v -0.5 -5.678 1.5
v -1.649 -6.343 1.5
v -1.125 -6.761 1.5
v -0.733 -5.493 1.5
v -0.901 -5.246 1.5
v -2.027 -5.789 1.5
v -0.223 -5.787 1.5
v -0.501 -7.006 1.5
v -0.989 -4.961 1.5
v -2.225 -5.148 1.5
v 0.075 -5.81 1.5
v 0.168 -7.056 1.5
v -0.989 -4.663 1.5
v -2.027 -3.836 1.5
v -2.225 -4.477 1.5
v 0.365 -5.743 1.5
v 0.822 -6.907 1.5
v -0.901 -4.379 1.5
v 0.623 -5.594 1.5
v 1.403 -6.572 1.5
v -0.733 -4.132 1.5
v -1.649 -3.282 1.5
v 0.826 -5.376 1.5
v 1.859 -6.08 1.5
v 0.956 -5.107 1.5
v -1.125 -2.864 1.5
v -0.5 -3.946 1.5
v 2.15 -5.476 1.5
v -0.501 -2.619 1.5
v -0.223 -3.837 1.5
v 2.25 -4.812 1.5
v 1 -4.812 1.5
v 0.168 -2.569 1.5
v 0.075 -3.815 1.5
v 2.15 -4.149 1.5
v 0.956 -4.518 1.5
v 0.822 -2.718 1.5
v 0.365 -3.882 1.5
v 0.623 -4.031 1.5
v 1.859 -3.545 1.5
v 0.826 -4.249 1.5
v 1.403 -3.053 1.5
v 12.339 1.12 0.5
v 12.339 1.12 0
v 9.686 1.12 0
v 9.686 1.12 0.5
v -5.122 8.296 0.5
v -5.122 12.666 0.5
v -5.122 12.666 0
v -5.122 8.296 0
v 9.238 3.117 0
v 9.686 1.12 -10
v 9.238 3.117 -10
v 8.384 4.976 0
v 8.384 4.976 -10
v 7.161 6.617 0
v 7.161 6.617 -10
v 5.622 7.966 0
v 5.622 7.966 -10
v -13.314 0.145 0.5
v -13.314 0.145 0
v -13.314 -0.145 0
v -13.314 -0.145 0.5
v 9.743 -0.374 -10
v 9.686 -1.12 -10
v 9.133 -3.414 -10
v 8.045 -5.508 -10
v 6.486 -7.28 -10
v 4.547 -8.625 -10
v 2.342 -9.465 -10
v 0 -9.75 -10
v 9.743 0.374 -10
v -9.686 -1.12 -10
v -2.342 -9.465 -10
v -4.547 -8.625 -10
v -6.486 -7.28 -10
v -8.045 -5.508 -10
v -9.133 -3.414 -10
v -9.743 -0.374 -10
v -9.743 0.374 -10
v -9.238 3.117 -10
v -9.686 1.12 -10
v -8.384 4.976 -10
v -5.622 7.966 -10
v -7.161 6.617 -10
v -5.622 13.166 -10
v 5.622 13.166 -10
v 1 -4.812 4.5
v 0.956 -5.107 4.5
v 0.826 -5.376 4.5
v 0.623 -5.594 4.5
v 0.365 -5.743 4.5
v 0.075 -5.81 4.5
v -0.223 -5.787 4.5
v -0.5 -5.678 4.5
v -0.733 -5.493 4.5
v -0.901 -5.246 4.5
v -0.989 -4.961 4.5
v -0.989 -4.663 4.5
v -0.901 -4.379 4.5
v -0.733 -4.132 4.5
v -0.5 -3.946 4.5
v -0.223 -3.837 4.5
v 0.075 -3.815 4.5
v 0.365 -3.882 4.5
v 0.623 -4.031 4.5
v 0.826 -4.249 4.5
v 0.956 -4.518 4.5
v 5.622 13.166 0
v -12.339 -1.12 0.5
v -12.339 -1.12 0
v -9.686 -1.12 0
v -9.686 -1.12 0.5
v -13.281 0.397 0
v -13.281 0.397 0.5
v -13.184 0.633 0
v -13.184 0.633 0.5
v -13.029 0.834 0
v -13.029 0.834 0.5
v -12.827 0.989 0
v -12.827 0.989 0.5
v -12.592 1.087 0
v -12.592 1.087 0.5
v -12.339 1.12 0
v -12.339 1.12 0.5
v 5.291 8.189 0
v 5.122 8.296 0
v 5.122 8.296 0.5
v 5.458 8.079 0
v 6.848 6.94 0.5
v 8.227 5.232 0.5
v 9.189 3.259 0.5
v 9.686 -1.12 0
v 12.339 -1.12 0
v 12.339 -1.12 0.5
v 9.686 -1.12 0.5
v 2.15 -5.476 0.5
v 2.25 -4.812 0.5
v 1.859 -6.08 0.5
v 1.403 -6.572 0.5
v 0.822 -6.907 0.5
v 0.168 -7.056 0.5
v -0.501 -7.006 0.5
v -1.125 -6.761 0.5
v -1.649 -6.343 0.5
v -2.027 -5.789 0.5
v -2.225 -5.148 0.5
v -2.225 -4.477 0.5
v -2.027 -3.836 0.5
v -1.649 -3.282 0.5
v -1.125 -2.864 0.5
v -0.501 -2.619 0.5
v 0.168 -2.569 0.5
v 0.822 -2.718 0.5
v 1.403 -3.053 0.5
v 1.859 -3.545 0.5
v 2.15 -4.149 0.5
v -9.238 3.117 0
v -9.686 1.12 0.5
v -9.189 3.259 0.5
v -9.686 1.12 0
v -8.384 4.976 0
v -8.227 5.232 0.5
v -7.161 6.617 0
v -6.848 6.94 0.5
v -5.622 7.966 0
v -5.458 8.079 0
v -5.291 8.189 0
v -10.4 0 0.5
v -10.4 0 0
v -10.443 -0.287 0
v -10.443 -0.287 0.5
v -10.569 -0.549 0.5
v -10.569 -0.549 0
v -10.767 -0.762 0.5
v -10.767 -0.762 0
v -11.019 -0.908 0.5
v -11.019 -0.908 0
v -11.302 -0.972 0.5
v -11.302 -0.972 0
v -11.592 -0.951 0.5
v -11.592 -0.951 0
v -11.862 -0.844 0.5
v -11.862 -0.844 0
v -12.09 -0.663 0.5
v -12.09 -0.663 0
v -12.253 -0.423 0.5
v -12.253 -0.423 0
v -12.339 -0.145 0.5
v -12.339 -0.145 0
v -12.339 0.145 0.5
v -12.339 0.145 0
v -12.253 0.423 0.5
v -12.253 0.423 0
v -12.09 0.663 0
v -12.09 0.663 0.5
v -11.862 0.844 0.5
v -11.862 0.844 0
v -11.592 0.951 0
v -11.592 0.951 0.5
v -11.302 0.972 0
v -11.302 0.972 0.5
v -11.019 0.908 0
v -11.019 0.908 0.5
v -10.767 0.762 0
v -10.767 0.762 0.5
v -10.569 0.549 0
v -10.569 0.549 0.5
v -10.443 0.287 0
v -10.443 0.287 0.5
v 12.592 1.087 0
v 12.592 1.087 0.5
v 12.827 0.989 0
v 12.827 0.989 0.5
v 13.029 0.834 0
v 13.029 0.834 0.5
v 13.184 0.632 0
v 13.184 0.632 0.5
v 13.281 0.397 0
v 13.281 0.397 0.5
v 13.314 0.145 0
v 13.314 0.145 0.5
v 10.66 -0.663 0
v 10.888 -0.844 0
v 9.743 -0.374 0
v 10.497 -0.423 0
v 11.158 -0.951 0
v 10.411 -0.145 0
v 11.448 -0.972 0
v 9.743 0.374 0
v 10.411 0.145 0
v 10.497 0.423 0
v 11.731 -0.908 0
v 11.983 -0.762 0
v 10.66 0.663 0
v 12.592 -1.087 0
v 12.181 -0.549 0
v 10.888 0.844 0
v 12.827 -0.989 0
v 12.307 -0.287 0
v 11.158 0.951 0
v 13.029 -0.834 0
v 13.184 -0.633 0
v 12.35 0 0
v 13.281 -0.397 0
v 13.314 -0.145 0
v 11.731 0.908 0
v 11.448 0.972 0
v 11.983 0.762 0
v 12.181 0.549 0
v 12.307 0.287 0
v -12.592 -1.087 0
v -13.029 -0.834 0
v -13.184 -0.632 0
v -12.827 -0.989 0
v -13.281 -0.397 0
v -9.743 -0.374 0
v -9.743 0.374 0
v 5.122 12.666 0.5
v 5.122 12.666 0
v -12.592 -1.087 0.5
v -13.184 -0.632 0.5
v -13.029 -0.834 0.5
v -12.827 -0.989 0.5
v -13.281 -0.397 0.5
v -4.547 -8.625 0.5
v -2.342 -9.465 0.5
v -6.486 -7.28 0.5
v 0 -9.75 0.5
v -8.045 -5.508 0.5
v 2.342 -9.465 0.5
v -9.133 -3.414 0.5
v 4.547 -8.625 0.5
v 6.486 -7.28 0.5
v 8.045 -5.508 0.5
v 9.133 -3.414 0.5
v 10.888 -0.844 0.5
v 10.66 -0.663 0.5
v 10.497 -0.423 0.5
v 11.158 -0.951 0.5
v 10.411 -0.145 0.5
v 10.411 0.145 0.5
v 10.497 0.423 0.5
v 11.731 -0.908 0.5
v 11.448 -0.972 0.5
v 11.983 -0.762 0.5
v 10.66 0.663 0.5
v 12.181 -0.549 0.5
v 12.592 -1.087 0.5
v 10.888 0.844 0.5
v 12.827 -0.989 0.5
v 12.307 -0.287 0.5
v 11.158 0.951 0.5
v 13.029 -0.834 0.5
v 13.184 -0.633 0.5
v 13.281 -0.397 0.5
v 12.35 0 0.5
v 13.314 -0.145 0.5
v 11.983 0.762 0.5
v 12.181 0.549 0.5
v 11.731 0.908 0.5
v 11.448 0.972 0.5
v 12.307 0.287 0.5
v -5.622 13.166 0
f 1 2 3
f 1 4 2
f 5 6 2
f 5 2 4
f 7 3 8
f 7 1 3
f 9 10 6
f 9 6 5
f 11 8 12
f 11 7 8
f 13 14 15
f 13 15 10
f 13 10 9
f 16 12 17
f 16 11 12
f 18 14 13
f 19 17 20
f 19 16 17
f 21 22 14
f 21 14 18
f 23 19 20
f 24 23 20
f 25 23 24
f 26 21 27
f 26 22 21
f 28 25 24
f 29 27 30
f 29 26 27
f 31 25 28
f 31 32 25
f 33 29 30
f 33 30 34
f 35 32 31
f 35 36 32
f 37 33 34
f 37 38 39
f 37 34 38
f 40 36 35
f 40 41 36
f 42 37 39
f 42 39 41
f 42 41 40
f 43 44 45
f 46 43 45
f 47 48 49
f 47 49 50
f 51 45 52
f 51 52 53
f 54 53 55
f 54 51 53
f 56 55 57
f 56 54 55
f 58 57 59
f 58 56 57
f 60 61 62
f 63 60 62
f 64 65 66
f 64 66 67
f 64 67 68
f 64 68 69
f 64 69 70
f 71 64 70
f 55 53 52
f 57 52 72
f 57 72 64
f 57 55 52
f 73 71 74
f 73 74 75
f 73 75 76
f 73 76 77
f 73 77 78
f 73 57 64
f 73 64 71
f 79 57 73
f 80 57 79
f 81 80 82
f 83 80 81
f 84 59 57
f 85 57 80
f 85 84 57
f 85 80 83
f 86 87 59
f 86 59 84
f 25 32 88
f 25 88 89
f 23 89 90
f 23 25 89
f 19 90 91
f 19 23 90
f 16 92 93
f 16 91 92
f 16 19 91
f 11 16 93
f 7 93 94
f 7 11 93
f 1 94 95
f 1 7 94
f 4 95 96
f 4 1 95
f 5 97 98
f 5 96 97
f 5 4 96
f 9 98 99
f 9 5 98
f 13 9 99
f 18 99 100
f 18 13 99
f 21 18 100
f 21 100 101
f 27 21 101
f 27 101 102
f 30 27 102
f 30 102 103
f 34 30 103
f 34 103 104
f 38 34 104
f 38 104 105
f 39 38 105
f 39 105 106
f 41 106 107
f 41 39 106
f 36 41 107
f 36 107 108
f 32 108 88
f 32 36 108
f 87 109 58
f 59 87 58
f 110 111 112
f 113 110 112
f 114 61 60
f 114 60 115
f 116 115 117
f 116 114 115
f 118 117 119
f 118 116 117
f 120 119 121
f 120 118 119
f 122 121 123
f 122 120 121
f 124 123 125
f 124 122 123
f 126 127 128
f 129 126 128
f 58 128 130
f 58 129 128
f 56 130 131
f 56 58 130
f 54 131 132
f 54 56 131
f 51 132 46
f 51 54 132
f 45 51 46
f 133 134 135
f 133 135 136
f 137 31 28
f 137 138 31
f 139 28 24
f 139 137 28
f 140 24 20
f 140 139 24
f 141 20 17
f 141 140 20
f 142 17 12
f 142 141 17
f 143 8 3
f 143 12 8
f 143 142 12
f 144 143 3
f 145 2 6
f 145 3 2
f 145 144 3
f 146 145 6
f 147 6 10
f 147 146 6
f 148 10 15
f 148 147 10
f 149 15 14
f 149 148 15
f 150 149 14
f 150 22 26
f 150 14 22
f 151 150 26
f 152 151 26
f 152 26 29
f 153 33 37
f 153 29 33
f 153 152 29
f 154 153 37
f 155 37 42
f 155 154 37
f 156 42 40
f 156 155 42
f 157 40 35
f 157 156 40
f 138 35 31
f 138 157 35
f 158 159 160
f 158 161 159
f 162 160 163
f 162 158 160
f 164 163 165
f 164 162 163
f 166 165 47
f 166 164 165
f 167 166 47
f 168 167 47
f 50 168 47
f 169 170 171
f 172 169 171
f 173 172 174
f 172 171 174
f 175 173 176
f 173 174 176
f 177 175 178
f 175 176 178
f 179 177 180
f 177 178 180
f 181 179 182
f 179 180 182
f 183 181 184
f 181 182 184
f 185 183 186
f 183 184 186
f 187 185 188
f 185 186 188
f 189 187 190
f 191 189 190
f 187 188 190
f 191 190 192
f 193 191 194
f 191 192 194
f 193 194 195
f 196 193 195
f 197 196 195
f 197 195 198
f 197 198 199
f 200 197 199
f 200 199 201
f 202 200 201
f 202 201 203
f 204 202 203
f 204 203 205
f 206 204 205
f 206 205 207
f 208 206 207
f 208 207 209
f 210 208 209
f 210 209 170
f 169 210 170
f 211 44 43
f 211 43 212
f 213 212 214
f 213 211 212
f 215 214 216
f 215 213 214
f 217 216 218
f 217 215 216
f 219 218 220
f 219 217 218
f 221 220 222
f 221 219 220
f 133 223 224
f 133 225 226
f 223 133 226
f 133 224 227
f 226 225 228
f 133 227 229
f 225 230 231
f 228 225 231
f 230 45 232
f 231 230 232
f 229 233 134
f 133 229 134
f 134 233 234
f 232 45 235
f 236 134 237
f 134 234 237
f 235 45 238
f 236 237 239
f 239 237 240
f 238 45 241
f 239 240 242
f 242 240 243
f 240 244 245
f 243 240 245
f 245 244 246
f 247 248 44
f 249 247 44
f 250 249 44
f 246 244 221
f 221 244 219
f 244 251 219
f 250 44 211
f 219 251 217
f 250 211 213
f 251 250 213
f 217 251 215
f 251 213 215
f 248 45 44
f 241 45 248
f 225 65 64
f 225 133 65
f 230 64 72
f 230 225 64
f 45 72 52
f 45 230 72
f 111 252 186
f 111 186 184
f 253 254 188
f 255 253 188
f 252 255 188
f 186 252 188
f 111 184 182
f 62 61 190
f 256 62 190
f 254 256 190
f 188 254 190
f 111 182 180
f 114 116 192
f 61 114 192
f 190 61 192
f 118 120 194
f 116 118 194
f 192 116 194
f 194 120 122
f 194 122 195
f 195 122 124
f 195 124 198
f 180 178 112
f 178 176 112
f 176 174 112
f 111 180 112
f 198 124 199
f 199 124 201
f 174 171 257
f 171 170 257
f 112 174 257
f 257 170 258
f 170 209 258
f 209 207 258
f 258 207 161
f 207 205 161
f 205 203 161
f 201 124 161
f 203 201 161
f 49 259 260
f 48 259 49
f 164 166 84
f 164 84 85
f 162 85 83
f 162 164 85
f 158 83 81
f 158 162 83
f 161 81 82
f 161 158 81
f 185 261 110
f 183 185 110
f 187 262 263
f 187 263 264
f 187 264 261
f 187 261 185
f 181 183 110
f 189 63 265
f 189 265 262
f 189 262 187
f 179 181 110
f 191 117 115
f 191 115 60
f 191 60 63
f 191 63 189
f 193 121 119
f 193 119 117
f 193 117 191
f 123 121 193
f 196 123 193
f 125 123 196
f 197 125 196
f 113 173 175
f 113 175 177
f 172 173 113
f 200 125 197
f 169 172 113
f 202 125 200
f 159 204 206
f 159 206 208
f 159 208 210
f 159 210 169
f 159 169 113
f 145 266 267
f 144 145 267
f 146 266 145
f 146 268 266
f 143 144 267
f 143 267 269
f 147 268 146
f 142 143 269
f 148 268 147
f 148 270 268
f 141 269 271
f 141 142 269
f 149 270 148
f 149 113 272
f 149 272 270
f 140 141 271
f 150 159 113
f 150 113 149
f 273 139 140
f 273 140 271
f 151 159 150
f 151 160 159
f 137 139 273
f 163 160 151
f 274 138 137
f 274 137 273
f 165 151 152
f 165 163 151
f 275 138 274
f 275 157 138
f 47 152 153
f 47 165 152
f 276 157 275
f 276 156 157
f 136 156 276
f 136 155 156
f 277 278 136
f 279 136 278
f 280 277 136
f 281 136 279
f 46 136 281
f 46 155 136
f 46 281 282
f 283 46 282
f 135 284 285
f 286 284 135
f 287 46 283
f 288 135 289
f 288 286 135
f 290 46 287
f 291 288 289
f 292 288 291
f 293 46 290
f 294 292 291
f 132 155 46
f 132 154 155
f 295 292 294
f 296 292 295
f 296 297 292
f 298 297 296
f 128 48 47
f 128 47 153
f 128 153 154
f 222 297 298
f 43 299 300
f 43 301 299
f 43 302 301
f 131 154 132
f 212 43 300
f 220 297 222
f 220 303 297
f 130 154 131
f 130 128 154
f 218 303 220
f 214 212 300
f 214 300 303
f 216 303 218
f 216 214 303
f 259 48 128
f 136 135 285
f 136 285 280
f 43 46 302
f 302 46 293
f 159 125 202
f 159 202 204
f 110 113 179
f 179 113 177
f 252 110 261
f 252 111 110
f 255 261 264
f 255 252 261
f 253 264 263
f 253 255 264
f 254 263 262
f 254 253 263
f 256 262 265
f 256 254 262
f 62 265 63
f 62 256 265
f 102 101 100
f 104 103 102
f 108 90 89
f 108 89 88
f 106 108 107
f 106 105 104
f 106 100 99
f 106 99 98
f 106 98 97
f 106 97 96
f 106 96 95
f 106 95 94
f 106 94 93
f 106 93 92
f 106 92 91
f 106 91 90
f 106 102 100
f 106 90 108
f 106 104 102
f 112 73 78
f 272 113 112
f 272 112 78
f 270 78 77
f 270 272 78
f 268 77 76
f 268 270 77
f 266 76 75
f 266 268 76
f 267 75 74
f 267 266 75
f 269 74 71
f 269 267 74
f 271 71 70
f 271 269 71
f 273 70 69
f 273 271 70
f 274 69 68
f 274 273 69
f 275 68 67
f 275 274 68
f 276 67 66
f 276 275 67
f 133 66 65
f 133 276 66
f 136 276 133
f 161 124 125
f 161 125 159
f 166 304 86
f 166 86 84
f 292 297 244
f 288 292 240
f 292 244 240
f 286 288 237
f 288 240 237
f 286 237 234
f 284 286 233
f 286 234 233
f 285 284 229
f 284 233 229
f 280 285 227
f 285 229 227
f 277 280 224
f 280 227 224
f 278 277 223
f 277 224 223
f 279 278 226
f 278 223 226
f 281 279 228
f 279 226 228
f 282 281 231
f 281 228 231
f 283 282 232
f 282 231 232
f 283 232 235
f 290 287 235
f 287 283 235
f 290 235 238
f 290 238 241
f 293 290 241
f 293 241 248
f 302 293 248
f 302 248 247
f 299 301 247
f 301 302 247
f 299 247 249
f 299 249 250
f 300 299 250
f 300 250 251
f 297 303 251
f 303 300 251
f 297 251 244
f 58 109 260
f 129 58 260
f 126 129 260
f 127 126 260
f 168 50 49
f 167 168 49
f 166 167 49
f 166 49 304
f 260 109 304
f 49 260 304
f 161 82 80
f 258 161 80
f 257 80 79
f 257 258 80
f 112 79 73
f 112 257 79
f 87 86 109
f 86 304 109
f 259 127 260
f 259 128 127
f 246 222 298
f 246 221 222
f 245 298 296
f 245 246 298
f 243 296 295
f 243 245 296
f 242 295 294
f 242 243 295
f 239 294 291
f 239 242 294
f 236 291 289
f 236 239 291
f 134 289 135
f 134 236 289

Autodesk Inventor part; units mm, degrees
ref_plane "YZ Plane" through (0, 0, 0) normal (1, 0, 0) x (0, 1, 0)
ref_plane "XZ Plane" through (0, 0, 0) normal (0, 1, 0) x (-1, 0, 0)
ref_plane "XY Plane" through (0, 0, 0) normal (0, 0, 1) x (1, 0, 0)
sketch "Boceto1" plane through (0, 0, 0) normal (0, 0, 1) x (1, 0, 0)
  circle A0 centre (-11.375, 0) radius 0.975
  arc A1 (13.3142, 0.145) -> (12.3392, 1.12) centre (12.3392, 0.145) ccw
  line L0 (12.3392, 1.12) -> (9.6855, 1.12)
  line L1 (18.4935, 0) -> (-19.3273, 0)
  arc A2 (12.3392, -1.12) -> (13.3142, -0.145) centre (12.3392, -0.145) ccw
  line L2 (12.3392, -1.12) -> (9.6855, -1.12)
  line L3 (0, 0) -> (0, 1.0605)
  arc A3 (-12.3392, 1.12) -> (-13.3142, 0.145) centre (-12.3392, 0.145) ccw
  line L4 (-12.3392, 1.12) -> (-9.6855, 1.12)
  line L5 (-12.3392, -1.12) -> (-9.6855, -1.12)
  arc A4 (-13.3142, -0.145) -> (-12.3392, -1.12) centre (-12.3392, -0.145) ccw
  line L6 (-5.1219, 12.666) -> (5.1219, 12.666)
  arc A5 (-5.1219, 8.2963) -> (-9.6855, 1.12) centre (0, 0) ccw
  arc A6 (-9.6855, -1.12) -> (9.6855, -1.12) centre (0, 0) ccw
  arc A7 (9.6855, 1.12) -> (5.1219, 8.2963) centre (0, 0) ccw
  line L7 (-5.1219, 12.666) -> (-5.1219, 8.2963)
  line L8 (5.1219, 12.666) -> (5.1219, 8.2963)
  line L9 (-13.3142, 0.145) -> (-13.3142, -0.145)
  line L10 (13.3142, 0.145) -> (13.3142, -0.145)
  circle A8 centre (11.375, 0) radius 0.975
  point P0 (13.3033, 0)
  point P1 (13.3142, 0)
  point P2 (5.1219, 10.4811)
  dimension "d2" = 1.95
  dimension "d4" = 11.375
  dimension "d7" = 1.95
  dimension "d12" = 2.6537
  dimension "d20" = 9.75
  dimension "d21" = 2.24
  dimension "d22" = 12.666
  dimension "d24" = 10.2439
  dimension "d25" = 10.2439
  dimension "d26" = 4.3697
  dimension "d29" = 1.95
  dimension "d30" = 11.375
extrude "Extrusión3" add sketch "Boceto1" along normal blind 0.5 contours L1 A8 L10 A2 L2 A6 L5 A4 L9 A0 | A0 L1 L9 A3 L4 A5 L7 L6 L8 A7 L0 A1 L10 A8
sketch "Boceto2" plane through (0, 0, 0) normal (0, 0, -1) x (-1, 0, 0)
  line L0 (-5.1219, 12.666) -> (5.1219, 12.666) projected
  line L1 (-5.1219, 8.2963) -> (-5.1219, 12.666) projected
  arc A0 (-5.1219, 8.2963) -> (-9.6855, 1.12) centre (0, 0) ccw projected
  line L2 (-12.3392, 1.12) -> (-9.6855, 1.12) projected
  arc A1 (-12.3392, 1.12) -> (-13.3142, 0.145) centre (-12.3392, 0.145) ccw projected
  line L3 (-13.3142, -0.145) -> (-13.3142, 0.145) projected
  arc A2 (-13.3142, -0.145) -> (-12.3392, -1.12) centre (-12.3392, -0.145) ccw projected
  line L4 (-9.6855, -1.12) -> (-12.3392, -1.12) projected
  arc A3 (-9.6855, -1.12) -> (9.6855, -1.12) centre (0, 0) ccw projected
  line L5 (12.3392, -1.12) -> (9.6855, -1.12) projected
  arc A4 (12.3392, -1.12) -> (13.3142, -0.145) centre (12.3392, -0.145) ccw projected
  line L6 (13.3142, 0.145) -> (13.3142, -0.145) projected
  arc A5 (13.3142, 0.145) -> (12.3392, 1.12) centre (12.3392, 0.145) ccw projected
  line L7 (9.6855, 1.12) -> (12.3392, 1.12) projected
  arc A6 (9.6855, 1.12) -> (5.1219, 8.2963) centre (0, 0) ccw projected
  line L8 (5.1219, 12.666) -> (5.1219, 8.2963) projected
  arc A7 (-5.1219, 8.2963) -> (5.1219, 8.2963) centre (0, 0) ccw
  line L9 (-5.1219, 8.2963) -> (-5.1219, 12.666) projected
  line L10 (-5.1219, 8.2963) -> (-5.1219, 12.666)
  line L11 (-5.1219, 12.666) -> (5.1219, 12.666)
  line L12 (5.1219, 8.2963) -> (5.1219, 12.666)
  point P0 (9.6855, -1.12)
  point P1 (-9.6855, 1.12)
extrude "Extrusión4" add sketch "Boceto2" along normal blind 10 contours L0 L8 A6 A7 A3 A0 L1
sketch "Boceto3" plane through (0, 0, 0) normal (0, 0, -1) x (-1, 0, 0)
  arc A0 (-5.1219, 8.2963) -> (5.1219, 8.2963) centre (0, 0) ccw projected
  line L0 (5.6225, 13.166) -> (-5.6225, 13.166)
  arc A1 (5.6225, 7.9656) -> (-5.6225, 7.9656) centre (0, 0) ccw
  line L1 (5.1219, 12.666) -> (-5.1219, 12.666) projected
  line L2 (5.6225, 13.166) -> (5.6225, 7.9656)
  line L3 (-5.6225, 13.166) -> (-5.6225, 7.9656)
  point P0 (0, 13.166)
  point P1 (0, 12.666)
  point P2 (-5.6225, 7.9656)
  point P3 (-5.1219, 8.2963)
  point P4 (5.1219, 8.2963)
  point P5 (5.6225, 7.9656)
  dimension "d38" = 11.245
  dimension "d39" = 13.166
extrude "Extrusión6" add sketch "Boceto3" along normal blind 10 contours A0 L3 L0 L2 A1
sketch "Boceto4" plane through (0, 0, 0.5) normal (0, 0, 1) x (1, 0, 0)
  circle A0 centre (0, -4.8124) radius 2.25
  point P0 (0, 0)
  dimension "d42" = 4.5
extrude "Extrusión7" add sketch "Boceto4" along normal blind 1
sketch "Boceto5" plane through (0, -4.8124, 1.5) normal (0, 0, 1) x (1, 0, 0)
  circle A0 centre (0, 0) radius 1
  point P0 (0, 4.8124)
  dimension "d45" = 2
extrude "Extrusión8" add sketch "Boceto5" along normal blind 3
properties part number "stepper_motor" material "Acero, suave"
